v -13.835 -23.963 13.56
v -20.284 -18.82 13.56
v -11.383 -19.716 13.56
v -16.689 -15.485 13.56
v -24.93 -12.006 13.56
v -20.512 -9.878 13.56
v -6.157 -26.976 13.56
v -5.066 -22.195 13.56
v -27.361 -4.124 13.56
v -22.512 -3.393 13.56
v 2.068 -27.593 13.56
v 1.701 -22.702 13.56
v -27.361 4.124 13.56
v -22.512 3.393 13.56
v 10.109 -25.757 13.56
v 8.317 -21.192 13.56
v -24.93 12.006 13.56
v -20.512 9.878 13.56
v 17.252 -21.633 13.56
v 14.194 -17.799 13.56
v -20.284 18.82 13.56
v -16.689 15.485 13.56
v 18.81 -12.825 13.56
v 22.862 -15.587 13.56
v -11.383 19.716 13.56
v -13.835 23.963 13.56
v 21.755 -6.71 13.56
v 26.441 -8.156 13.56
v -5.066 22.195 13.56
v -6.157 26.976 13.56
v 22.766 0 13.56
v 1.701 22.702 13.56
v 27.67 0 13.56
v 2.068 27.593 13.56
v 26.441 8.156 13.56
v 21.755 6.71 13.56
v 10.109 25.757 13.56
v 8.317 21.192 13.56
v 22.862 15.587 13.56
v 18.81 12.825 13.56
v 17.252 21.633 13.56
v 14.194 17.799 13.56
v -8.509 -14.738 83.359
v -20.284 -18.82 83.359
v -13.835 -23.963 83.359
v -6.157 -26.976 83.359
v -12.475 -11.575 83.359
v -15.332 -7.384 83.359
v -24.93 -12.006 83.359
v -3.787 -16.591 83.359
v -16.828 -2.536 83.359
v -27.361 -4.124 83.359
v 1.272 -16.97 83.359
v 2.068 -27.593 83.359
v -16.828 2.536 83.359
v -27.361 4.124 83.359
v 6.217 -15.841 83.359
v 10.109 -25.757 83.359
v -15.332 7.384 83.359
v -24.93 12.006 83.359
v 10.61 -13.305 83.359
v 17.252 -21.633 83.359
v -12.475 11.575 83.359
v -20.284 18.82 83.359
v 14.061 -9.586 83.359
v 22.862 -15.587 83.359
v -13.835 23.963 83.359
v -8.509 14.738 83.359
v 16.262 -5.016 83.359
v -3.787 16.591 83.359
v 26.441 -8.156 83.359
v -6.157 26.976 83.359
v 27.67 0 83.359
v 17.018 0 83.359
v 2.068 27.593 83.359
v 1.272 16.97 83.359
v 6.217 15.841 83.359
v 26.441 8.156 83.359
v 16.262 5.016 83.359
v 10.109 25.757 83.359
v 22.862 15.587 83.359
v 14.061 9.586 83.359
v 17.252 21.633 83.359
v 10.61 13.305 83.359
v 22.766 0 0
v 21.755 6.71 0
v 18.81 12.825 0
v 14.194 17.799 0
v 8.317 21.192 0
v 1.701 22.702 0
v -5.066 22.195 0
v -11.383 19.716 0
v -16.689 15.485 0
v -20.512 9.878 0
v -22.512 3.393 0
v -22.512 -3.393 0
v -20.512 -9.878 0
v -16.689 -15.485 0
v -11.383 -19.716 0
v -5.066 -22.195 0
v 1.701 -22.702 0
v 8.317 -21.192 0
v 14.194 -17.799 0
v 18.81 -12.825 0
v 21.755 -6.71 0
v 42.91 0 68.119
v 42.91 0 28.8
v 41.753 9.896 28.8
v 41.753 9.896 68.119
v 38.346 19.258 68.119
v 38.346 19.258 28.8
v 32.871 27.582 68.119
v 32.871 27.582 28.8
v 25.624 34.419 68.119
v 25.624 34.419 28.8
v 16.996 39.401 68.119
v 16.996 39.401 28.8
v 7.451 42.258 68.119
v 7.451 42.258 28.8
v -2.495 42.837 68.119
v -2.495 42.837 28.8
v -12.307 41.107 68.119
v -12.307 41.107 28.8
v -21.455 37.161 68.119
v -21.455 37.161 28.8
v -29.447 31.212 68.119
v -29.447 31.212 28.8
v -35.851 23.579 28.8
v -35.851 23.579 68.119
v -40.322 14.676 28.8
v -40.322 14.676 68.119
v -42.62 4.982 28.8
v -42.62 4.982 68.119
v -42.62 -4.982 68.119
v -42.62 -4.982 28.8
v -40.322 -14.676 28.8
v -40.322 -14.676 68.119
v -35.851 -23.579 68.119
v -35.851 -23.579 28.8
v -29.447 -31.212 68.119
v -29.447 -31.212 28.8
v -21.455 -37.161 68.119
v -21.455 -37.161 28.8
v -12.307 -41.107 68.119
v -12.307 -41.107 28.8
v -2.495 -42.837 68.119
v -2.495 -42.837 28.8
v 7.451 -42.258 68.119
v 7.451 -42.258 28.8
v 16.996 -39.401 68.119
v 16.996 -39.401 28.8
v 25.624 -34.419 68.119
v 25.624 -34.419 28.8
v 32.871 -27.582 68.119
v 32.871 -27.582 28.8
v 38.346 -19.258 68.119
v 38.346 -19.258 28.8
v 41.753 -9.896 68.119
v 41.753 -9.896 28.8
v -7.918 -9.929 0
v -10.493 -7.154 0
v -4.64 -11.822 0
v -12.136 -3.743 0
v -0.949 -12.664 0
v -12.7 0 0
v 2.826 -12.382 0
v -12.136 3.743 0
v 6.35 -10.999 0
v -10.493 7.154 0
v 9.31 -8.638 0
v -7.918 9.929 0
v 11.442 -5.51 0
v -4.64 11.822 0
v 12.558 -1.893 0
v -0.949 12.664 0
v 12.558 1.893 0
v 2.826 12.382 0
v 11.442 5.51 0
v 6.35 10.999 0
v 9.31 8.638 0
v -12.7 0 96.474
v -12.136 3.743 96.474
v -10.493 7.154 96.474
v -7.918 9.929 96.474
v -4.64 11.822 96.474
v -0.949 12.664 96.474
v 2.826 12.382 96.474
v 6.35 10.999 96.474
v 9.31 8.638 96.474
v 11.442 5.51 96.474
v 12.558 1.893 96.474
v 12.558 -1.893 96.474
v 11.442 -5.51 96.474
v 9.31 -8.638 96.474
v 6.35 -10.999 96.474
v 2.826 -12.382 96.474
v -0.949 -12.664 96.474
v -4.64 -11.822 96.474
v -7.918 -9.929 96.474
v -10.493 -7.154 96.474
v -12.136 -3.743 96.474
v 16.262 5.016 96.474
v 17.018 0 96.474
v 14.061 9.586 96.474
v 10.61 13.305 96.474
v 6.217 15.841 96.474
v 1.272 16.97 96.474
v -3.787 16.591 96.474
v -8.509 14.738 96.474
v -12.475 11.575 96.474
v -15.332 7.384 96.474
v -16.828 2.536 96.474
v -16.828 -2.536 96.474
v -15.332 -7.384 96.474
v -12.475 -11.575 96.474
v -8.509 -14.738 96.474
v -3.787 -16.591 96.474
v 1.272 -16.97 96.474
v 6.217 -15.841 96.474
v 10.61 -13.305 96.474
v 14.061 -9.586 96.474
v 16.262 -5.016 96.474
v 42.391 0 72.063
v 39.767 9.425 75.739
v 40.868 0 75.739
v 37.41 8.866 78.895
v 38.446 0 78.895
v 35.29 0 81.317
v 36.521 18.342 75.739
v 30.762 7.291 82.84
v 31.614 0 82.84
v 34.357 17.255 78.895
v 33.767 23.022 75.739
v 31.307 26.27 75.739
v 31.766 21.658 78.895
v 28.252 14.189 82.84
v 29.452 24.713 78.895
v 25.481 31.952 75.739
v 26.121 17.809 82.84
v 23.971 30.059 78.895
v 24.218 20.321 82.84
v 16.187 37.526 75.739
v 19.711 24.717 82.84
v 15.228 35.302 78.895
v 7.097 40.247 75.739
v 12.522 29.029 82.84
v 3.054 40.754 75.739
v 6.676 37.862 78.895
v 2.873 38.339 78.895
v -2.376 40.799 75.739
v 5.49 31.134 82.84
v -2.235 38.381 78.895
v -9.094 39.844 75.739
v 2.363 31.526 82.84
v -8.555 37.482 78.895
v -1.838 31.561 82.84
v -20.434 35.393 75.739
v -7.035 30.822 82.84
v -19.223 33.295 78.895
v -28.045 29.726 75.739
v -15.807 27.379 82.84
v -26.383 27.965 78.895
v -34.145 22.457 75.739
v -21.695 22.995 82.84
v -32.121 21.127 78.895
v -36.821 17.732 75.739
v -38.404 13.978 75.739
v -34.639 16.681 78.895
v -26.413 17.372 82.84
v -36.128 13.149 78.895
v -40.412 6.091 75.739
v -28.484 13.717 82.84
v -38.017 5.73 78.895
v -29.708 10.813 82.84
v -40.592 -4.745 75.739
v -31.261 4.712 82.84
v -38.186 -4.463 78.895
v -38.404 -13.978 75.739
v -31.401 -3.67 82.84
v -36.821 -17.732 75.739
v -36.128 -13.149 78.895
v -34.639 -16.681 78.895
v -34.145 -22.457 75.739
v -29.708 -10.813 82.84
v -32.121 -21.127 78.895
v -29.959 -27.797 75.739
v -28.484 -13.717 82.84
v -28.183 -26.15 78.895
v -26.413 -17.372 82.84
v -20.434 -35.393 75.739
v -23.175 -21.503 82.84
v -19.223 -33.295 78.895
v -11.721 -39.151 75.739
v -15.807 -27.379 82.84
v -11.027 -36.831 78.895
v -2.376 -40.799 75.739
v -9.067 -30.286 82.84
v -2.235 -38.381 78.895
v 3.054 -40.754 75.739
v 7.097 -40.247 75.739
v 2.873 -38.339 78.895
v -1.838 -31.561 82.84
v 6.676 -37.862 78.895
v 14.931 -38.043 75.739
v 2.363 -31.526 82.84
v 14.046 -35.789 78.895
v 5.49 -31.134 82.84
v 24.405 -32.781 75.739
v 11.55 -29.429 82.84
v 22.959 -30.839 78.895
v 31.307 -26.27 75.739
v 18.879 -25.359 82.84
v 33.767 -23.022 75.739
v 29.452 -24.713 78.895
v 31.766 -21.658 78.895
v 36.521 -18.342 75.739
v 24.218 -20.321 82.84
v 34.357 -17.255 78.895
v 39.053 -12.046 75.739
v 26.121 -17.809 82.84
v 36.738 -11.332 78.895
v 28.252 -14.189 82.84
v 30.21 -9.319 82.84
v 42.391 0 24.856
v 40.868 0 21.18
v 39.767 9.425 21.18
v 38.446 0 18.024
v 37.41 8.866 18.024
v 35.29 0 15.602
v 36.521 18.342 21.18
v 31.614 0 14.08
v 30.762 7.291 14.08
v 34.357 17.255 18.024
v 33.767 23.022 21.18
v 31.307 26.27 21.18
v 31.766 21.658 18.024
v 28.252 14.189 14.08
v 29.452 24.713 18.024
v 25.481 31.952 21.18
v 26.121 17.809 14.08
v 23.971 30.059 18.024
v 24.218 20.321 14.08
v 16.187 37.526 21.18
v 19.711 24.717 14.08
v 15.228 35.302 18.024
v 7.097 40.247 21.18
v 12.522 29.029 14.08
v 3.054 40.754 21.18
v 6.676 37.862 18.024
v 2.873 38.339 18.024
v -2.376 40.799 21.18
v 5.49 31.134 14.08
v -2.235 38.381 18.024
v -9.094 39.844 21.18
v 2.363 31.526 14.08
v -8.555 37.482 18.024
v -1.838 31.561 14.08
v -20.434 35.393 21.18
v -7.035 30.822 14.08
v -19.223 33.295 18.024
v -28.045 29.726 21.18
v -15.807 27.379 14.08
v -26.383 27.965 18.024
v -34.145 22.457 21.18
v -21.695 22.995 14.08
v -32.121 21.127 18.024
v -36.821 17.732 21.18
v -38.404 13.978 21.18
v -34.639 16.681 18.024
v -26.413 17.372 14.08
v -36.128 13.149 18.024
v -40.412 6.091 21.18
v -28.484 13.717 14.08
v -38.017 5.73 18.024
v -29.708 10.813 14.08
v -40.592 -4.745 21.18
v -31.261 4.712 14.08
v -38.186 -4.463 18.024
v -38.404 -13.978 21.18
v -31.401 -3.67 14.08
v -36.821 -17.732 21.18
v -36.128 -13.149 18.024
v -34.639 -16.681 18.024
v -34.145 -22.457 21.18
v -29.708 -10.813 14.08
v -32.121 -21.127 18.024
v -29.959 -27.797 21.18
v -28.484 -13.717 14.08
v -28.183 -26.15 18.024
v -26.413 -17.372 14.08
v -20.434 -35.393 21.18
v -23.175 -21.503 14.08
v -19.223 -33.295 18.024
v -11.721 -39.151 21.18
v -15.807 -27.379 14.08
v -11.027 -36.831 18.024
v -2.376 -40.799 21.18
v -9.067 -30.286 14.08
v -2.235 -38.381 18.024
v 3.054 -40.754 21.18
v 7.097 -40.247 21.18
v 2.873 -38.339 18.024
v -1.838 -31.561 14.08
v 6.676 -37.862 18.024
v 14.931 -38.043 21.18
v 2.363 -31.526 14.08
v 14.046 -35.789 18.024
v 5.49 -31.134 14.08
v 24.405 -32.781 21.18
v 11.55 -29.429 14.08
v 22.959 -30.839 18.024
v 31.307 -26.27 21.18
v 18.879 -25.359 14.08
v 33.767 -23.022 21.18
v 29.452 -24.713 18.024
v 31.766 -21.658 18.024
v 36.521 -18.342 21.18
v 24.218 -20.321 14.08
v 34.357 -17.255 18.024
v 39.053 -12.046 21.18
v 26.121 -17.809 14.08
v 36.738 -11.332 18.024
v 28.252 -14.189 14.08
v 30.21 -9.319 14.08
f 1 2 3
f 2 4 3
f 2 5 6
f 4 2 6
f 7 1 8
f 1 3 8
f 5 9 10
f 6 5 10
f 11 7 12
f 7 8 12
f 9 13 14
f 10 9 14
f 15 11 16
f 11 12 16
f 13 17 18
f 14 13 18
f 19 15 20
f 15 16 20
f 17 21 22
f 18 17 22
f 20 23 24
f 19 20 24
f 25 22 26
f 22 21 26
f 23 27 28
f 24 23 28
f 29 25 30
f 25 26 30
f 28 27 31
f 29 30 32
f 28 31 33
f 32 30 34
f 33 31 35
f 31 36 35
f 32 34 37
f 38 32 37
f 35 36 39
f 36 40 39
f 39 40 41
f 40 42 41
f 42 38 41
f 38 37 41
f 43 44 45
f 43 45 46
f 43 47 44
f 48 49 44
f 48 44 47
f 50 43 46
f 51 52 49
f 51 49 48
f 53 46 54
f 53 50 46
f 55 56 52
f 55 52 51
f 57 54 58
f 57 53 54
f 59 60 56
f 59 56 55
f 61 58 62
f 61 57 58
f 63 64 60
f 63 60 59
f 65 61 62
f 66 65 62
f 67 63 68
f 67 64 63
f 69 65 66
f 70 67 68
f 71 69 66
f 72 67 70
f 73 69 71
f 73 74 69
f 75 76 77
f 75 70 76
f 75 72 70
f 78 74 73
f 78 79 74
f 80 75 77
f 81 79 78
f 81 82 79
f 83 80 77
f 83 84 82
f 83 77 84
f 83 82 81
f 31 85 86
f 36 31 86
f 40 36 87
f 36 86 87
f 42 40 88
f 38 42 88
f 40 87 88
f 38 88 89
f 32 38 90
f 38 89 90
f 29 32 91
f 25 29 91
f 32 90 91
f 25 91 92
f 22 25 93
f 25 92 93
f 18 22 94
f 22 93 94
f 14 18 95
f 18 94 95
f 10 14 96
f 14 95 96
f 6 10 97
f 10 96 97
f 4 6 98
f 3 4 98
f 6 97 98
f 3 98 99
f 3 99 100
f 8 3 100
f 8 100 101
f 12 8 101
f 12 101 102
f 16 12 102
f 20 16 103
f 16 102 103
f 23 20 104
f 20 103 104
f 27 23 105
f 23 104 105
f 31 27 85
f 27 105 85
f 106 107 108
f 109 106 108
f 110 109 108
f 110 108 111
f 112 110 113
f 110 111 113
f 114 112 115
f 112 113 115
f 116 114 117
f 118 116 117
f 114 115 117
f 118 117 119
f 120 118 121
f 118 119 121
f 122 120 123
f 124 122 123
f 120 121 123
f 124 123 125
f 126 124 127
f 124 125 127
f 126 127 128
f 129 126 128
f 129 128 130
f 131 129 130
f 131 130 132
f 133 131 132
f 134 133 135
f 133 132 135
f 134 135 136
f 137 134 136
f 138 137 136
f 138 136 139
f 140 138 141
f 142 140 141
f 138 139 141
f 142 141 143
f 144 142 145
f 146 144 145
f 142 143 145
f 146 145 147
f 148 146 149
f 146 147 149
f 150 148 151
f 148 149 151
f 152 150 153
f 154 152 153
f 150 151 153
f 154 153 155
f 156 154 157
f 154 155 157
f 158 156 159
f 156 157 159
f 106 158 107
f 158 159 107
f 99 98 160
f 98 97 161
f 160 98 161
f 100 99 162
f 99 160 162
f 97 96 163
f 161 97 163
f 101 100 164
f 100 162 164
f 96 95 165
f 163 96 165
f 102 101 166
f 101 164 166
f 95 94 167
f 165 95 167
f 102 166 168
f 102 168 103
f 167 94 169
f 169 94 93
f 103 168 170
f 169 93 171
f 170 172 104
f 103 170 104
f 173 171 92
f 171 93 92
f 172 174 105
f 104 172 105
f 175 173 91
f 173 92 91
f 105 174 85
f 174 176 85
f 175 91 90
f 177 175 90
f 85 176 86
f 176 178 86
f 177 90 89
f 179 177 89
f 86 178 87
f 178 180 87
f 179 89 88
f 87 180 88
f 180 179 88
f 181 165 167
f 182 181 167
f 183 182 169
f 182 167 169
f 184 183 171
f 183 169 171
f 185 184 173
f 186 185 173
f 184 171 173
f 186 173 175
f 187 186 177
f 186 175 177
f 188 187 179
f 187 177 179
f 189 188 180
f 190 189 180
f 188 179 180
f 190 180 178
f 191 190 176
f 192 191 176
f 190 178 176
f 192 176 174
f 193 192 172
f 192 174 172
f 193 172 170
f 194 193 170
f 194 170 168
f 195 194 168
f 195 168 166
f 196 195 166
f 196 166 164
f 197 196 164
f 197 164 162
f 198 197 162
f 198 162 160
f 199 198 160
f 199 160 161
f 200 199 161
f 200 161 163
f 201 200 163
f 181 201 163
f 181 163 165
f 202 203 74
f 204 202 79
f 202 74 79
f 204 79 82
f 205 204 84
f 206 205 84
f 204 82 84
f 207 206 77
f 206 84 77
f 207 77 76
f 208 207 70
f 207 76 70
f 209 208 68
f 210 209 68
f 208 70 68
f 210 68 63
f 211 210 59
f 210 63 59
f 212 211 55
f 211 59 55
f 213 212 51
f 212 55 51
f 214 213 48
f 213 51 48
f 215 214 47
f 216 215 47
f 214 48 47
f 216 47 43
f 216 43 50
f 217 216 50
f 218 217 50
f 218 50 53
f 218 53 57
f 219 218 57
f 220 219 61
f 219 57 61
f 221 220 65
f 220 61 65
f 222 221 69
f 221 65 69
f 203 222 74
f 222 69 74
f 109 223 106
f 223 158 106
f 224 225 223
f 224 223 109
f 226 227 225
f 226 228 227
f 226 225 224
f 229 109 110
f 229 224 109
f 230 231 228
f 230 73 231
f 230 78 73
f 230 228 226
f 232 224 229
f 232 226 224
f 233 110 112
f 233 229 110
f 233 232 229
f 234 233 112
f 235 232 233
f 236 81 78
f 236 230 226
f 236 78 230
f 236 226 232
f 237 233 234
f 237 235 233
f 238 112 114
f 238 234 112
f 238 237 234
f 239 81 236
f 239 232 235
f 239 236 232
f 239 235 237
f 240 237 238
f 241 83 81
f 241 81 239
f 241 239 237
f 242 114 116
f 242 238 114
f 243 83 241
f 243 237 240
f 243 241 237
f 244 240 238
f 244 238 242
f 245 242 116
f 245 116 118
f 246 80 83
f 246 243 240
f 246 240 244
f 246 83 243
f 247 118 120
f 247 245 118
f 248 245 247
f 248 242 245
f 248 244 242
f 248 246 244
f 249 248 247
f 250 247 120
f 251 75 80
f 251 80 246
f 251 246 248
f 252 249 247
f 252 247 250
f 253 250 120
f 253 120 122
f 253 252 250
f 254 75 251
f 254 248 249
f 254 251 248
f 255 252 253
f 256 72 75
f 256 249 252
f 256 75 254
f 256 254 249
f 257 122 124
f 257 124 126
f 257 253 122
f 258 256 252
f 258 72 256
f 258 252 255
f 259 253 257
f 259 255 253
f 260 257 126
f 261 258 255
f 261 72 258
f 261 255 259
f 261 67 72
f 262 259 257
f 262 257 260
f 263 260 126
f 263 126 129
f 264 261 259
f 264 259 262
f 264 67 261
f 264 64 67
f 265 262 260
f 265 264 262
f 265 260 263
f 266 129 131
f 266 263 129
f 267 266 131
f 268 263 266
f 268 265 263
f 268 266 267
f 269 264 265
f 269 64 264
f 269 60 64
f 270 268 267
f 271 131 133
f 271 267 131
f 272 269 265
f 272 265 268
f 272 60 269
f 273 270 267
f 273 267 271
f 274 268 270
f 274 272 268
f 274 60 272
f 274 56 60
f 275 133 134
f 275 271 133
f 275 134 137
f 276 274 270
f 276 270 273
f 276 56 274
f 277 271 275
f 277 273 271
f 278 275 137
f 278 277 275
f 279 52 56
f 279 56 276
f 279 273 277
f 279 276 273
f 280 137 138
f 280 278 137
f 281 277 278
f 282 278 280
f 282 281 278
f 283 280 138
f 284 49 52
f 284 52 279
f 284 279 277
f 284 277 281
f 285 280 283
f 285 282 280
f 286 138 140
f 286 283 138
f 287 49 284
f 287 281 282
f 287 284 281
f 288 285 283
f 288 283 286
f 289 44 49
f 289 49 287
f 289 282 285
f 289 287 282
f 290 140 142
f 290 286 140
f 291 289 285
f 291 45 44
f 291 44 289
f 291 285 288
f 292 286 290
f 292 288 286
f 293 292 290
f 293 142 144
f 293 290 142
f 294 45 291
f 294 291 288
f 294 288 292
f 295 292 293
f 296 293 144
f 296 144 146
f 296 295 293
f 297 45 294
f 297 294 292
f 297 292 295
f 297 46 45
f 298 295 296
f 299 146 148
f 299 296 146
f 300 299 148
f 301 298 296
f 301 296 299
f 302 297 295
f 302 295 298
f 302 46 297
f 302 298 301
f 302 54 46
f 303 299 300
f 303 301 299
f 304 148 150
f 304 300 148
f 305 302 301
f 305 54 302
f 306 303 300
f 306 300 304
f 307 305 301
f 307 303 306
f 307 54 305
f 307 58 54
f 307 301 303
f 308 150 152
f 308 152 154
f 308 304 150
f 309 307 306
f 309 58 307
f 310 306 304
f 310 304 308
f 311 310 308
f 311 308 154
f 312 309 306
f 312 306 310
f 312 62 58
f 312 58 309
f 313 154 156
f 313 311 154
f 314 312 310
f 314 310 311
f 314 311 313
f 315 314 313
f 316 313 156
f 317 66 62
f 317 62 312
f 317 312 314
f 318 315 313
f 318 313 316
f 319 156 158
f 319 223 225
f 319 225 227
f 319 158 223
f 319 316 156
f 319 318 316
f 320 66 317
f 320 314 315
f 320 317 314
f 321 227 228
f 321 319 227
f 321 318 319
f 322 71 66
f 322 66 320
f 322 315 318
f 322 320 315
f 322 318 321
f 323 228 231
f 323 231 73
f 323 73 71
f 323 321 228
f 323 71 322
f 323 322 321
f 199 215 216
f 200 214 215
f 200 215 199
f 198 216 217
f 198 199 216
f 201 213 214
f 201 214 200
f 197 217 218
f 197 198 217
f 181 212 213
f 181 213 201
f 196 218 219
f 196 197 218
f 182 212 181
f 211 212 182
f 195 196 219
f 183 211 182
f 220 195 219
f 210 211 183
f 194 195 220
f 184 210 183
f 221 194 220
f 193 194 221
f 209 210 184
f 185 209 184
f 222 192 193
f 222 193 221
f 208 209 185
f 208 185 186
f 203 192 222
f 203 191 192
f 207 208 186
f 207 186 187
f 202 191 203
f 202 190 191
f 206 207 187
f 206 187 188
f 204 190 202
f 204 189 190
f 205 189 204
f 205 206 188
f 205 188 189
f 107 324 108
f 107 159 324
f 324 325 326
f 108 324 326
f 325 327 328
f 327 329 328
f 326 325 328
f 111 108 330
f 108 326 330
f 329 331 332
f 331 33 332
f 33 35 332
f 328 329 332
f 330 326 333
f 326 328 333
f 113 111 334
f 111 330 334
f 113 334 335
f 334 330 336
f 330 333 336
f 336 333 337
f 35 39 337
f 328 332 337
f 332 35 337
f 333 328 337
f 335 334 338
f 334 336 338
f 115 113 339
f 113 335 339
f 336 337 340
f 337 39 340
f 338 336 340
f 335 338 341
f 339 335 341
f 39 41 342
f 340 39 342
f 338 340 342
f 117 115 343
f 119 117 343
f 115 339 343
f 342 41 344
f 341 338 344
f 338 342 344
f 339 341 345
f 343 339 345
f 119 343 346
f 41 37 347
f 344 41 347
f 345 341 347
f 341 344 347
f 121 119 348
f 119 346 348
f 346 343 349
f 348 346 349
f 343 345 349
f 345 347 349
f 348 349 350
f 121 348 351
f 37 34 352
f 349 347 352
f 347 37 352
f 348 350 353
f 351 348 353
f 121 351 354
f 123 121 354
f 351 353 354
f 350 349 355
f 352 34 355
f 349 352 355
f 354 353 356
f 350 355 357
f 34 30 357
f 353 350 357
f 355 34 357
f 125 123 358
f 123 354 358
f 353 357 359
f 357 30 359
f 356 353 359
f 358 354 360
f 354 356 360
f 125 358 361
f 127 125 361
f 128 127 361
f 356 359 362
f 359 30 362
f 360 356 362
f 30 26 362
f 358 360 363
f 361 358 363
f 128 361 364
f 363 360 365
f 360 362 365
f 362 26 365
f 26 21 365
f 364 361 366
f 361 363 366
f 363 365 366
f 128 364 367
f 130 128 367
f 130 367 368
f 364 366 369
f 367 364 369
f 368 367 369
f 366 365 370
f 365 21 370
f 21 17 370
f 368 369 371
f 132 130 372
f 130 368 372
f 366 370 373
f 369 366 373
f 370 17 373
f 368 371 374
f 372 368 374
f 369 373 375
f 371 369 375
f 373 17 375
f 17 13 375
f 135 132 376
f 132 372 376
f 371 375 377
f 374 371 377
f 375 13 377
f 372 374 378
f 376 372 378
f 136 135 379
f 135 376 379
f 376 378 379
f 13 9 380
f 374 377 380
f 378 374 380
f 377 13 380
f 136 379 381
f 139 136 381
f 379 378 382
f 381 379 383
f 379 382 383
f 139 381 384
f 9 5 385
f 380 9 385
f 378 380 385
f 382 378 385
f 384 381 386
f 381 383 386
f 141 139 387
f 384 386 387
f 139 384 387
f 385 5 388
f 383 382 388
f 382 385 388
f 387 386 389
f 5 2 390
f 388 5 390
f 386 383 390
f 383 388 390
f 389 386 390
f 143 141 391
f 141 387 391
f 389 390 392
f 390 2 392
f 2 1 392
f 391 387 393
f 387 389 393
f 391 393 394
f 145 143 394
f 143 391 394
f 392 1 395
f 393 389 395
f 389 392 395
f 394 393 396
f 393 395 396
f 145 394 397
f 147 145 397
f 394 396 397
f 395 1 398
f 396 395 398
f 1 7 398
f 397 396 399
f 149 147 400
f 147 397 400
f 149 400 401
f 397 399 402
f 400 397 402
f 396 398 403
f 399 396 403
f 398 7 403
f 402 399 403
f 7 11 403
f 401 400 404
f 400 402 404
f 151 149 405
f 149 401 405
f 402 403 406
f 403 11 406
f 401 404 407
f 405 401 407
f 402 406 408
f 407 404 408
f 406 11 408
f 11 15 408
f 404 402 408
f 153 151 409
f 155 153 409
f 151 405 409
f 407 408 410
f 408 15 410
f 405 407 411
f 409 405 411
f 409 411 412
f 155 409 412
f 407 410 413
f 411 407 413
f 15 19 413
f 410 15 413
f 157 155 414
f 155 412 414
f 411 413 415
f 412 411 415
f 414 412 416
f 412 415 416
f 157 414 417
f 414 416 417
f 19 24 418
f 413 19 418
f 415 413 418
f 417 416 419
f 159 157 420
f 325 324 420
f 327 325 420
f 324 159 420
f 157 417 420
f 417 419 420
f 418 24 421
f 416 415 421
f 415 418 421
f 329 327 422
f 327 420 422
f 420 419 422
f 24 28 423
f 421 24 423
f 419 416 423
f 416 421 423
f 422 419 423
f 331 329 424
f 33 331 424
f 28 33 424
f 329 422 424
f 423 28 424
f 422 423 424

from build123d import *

# Parameters (mm, degrees)
F0_R     = 22.766123
F1_DEPTH = 13.56037
F2_R     = 42.909984
F2_R_2   = 22.766123
F3_DEPTH = 69.79863
F4_R     = 17.01771
F5_DEPTH = 13.11468
F6_R     = 15.24
F8_D     = 25.4


with BuildPart() as f1:
    # F0 (on Top) → F1 (new body)
    with BuildSketch(Plane.XY):
        Circle(F0_R)
    extrude(amount=F1_DEPTH)

    # F2 (on face) → F3 (join)
    with BuildSketch(Plane.XY.offset(13.56037)):
        Circle(F2_R)
        Circle(F2_R_2, mode=Mode.SUBTRACT)
        Circle(F2_R_2)
    extrude(amount=F3_DEPTH)

    # F4 (on face) → F5 (join)
    with BuildSketch(Plane.XY.offset(83.359)):
        Circle(F4_R)
    extrude(amount=F5_DEPTH)

    # F6
    f6_edges = [f1.edges().sort_by_distance(p)[0] for p in [
        (-42.909984, 0, 83.359),
        (-42.909984, 0, 13.56037),
    ]]
    fillet(f6_edges, radius=F6_R)

    # F8 (through all)
    with Locations(Plane.XY.offset(96.47368)):
        with Locations((0, 0)):
            Hole(F8_D / 2)


solid = f1.part
